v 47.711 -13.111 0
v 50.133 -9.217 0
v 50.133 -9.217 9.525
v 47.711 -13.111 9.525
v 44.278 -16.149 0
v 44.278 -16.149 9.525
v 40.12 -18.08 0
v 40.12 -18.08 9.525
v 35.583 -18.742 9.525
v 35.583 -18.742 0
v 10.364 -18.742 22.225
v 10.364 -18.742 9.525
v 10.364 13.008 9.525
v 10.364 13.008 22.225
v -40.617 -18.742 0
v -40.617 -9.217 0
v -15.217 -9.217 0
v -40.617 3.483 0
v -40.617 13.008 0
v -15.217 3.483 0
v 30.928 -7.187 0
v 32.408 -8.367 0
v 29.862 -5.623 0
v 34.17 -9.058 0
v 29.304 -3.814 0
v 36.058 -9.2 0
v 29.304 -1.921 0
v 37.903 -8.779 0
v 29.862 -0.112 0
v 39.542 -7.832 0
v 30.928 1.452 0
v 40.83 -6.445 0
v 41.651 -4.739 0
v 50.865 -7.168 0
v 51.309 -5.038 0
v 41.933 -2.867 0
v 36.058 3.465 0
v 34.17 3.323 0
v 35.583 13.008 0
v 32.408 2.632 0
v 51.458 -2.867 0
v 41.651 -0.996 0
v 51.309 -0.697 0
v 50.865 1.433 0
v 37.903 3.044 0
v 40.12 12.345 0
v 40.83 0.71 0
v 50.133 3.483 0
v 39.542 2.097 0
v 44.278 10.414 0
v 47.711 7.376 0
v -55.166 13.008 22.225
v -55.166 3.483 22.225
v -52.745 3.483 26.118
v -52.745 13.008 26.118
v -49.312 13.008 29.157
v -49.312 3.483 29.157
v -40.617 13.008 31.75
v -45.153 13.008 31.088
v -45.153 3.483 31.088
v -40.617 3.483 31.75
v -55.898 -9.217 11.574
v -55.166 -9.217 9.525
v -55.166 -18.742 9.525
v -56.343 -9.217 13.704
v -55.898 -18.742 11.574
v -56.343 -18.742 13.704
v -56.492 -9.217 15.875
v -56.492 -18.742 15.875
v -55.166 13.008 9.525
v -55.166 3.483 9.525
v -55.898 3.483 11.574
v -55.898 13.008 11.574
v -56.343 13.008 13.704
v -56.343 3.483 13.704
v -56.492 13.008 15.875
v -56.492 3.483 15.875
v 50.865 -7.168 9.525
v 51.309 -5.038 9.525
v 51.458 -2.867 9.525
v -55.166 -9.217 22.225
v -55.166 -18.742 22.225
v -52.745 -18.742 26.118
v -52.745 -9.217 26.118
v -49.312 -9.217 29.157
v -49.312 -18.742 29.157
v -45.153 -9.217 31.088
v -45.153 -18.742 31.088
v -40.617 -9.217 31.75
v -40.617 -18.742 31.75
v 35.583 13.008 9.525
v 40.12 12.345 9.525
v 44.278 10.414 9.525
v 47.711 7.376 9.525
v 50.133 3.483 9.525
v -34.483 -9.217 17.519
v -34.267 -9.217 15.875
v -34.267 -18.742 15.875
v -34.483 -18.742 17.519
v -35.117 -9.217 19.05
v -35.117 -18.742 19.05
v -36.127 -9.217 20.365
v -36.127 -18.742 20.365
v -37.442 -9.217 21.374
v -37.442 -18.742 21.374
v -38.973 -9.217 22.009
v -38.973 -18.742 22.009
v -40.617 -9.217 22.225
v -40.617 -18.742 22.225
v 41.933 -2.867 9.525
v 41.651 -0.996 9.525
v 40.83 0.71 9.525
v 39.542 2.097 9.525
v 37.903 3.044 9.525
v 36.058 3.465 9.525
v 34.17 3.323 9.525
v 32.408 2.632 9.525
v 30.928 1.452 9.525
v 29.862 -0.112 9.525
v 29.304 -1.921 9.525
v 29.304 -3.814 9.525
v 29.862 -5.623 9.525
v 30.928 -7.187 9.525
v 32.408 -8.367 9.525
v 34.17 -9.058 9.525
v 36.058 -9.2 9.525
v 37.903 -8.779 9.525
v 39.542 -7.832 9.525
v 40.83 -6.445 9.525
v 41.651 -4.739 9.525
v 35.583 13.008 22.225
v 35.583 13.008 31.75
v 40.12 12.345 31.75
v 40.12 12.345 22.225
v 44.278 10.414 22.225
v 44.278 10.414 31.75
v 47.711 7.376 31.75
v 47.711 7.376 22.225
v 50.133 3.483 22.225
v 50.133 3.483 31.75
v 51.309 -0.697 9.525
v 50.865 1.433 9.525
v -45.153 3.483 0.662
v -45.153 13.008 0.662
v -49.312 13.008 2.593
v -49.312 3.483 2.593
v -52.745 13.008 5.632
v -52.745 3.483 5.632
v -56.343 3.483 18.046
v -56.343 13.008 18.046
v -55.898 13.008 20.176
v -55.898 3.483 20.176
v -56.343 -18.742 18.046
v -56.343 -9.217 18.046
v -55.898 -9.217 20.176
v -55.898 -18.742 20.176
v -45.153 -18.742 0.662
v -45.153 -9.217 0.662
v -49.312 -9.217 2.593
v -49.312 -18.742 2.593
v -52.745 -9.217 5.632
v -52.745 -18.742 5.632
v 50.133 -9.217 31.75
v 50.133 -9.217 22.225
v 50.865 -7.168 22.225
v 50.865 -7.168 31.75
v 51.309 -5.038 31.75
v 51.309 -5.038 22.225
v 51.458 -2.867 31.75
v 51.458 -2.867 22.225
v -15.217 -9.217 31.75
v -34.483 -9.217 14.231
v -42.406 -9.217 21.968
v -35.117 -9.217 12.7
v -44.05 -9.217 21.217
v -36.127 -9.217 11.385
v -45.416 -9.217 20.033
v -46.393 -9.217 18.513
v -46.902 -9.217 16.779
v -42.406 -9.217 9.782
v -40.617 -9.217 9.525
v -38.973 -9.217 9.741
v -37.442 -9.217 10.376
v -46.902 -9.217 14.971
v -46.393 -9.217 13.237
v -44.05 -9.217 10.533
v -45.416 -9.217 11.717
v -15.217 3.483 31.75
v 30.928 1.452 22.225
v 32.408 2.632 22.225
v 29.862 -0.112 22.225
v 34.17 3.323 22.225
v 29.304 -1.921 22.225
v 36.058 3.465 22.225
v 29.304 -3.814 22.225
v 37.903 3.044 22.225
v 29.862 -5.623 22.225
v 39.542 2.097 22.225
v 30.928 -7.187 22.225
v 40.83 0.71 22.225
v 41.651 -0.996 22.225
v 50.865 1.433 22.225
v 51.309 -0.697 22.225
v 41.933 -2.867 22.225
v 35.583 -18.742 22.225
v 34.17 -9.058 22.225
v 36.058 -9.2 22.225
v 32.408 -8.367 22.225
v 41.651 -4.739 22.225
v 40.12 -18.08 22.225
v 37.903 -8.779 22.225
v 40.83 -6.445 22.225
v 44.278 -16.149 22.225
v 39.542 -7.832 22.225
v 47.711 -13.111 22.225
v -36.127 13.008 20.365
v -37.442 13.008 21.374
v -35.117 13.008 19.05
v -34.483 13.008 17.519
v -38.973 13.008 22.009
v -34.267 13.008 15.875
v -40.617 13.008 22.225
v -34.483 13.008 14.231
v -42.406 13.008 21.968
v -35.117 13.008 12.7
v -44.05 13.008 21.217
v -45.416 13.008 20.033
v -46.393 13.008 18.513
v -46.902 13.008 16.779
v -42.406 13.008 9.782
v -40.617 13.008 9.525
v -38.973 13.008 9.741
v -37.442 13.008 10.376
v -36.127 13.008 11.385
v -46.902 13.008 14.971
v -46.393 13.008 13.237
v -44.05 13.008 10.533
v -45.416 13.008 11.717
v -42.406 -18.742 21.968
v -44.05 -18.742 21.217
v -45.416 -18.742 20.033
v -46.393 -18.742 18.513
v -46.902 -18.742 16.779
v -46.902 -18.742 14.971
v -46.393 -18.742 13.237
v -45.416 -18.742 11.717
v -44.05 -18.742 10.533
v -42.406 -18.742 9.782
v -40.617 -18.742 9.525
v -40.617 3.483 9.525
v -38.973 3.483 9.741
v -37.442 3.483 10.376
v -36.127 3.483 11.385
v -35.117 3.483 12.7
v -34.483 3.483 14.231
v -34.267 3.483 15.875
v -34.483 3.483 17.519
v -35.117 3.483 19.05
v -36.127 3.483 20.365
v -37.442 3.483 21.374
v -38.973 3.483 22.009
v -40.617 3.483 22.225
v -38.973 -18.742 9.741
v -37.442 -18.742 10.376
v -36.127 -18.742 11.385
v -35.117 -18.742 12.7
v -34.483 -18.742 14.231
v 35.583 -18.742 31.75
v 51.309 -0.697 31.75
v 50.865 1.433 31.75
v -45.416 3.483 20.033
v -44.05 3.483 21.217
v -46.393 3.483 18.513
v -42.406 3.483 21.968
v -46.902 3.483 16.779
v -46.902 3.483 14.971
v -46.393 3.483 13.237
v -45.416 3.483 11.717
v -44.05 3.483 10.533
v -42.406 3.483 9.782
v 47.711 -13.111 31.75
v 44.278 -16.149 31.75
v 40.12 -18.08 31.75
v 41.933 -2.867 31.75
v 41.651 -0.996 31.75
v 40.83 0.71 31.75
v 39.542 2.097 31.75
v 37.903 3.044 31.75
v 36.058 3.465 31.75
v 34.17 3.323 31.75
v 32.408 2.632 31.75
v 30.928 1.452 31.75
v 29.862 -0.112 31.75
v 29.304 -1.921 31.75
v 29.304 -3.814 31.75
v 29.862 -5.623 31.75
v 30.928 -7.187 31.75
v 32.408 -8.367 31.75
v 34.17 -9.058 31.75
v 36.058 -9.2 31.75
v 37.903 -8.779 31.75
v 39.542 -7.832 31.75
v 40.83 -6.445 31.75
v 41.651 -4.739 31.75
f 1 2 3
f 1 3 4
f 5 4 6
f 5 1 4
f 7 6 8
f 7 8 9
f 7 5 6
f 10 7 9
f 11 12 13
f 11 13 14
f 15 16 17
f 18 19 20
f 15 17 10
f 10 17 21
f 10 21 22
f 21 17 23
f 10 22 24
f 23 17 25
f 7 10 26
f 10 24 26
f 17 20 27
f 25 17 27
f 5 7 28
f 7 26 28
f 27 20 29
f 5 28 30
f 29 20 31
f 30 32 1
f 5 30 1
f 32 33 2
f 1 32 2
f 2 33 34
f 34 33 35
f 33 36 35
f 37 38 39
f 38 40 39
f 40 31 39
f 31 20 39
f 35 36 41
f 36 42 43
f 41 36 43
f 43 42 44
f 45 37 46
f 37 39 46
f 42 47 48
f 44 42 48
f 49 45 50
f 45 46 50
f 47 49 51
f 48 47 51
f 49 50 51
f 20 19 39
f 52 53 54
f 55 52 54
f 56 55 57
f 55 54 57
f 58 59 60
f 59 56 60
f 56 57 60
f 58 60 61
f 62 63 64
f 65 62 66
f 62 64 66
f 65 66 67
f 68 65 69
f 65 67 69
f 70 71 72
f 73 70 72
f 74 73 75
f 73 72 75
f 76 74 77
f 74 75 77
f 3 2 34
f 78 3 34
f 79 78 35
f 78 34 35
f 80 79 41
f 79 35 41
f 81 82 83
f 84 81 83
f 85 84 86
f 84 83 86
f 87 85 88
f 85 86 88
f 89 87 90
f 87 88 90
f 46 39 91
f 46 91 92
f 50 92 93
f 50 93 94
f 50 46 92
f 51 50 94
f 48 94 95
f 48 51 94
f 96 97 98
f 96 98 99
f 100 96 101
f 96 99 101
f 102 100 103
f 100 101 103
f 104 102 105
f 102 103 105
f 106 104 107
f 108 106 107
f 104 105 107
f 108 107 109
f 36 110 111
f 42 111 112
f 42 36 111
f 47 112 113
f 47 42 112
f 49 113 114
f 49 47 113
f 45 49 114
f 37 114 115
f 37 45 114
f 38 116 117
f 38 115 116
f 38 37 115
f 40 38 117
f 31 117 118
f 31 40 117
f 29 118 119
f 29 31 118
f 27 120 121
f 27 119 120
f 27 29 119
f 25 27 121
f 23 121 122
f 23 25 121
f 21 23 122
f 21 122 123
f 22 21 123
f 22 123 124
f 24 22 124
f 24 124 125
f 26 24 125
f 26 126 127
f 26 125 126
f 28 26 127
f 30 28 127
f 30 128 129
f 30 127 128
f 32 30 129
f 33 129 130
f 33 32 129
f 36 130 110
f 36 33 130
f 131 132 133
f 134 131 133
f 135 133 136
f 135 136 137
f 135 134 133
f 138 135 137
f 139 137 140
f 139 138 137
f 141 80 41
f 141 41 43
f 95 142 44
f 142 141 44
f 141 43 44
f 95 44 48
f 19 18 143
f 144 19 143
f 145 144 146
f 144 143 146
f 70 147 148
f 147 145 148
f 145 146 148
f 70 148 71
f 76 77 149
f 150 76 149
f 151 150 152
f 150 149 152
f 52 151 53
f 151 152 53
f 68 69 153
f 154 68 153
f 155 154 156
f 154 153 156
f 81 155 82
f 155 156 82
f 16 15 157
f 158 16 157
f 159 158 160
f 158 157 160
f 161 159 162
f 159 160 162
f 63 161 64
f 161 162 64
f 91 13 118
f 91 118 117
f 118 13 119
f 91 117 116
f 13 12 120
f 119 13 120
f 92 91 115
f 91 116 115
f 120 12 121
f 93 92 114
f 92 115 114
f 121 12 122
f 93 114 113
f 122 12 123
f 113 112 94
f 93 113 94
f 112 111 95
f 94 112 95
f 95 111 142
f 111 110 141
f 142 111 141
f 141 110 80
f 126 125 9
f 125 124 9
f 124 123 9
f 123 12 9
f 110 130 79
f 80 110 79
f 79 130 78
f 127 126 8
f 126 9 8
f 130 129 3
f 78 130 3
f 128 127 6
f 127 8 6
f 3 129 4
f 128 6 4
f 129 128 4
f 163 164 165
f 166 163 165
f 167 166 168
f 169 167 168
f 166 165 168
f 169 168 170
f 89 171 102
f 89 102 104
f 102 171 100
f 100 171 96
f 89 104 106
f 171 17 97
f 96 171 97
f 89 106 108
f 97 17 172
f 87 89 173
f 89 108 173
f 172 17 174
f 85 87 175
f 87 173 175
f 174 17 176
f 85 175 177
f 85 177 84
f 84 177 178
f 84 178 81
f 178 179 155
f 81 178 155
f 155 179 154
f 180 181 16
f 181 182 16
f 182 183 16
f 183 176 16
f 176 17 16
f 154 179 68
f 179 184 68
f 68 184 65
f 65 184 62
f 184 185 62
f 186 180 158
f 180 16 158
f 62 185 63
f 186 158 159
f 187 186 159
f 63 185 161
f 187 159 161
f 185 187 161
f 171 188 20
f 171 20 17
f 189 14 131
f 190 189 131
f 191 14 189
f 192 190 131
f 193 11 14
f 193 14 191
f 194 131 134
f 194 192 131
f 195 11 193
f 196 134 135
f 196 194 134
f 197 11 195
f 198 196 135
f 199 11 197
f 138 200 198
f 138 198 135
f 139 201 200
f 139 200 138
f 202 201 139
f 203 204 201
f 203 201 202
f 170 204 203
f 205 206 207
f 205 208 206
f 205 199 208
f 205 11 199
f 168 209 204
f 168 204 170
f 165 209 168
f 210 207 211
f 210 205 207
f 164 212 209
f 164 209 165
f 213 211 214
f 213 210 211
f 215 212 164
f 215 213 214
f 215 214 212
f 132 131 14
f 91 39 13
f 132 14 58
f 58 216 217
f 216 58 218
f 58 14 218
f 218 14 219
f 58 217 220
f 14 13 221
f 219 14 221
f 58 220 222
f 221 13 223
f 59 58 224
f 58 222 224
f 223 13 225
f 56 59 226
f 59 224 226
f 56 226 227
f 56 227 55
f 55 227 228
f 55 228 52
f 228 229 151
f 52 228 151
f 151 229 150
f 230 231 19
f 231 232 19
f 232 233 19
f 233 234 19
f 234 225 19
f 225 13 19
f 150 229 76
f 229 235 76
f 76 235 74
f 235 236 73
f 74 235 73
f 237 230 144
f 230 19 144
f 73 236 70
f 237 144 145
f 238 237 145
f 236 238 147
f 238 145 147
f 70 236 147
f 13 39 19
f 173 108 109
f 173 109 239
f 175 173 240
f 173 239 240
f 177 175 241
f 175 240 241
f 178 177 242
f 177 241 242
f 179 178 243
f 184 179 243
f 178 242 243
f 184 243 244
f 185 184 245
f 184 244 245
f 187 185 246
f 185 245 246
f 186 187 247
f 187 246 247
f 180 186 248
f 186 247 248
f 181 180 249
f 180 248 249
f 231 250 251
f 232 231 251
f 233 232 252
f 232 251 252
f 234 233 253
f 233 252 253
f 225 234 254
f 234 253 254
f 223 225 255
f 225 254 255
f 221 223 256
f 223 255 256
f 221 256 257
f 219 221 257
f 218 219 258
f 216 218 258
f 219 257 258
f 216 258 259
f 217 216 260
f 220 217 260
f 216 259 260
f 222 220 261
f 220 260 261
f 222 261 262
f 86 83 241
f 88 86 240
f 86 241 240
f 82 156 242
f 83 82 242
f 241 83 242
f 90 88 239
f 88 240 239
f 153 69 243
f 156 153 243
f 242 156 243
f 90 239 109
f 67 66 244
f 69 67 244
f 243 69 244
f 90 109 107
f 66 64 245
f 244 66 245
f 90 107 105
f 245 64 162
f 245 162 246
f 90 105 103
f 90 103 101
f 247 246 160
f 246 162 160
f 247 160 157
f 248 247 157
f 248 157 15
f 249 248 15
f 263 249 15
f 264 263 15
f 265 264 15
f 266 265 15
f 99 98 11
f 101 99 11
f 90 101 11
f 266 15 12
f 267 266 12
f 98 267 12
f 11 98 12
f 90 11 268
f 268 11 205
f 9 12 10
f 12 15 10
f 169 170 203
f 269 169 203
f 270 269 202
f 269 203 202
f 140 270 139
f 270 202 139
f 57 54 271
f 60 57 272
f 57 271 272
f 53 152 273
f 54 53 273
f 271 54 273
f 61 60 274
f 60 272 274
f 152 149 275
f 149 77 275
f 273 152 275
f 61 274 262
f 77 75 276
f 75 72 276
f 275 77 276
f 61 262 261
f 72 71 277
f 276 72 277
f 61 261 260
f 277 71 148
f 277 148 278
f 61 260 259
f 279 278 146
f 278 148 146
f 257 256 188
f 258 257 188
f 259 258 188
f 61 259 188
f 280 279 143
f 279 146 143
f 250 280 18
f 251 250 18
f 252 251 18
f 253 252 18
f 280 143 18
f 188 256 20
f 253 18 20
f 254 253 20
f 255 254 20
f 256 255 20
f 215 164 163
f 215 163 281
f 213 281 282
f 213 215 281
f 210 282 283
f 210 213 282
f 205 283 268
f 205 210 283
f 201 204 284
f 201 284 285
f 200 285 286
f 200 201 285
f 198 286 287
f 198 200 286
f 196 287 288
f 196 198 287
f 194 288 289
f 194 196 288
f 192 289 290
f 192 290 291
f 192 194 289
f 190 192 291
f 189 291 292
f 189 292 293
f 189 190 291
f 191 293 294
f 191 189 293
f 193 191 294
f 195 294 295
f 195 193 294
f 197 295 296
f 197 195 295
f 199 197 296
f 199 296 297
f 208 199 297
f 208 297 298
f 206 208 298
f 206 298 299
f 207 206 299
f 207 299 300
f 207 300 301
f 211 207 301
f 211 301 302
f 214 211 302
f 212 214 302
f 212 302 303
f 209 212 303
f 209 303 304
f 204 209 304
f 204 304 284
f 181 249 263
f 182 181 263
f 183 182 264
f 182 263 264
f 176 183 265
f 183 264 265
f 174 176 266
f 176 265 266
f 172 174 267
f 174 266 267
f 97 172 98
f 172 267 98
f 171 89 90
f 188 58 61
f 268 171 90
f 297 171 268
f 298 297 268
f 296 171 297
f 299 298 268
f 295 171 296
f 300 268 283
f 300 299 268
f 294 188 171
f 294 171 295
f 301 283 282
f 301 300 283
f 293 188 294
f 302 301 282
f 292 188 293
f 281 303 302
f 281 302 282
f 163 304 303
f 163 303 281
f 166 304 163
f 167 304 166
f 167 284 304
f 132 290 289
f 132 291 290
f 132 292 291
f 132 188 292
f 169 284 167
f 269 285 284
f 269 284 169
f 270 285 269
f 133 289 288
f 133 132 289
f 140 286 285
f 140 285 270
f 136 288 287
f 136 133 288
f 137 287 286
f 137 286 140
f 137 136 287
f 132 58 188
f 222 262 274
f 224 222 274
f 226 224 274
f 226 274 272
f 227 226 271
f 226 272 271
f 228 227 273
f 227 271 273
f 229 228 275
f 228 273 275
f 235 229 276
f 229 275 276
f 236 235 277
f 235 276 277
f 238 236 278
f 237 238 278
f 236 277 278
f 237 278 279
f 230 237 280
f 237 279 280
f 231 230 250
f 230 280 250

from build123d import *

# Parameters (mm, degrees)
F0_R     = 6.35
F1_DEPTH = 31.75
F0_W     = 41.275
F0_H     = 12.7
F3_DEPTH = 31.75
F2_W     = 41.275
F2_H     = 12.7
F4_DEPTH = 31.751
F5_DEPTH = 31.751


with BuildPart() as f1:
    # F0 (on Top) → F1 (new body)
    with BuildSketch(Plane.XY):
        with BuildLine():
            ThreePointArc((35.5833037704, -18.7424994532), (22.3013258492, -11.5625950536), (21.0336259389, 3.4825005468))
            Line((21.0336259389, 3.4825005468), (-15.2166962296, 3.4825005468))
            Line((-15.2166962296, 3.4825005468), (-15.2166962296, -9.2174994532))
            Line((-15.2166962296, -9.2174994532), (-56.4916962296, -9.2174994532))
            Line((-56.4916962296, -9.2174994532), (-56.4916962296, -18.7424994532))
            Line((-56.4916962296, -18.7424994532), (35.5833037704, -18.7424994532))
        make_face()
        with BuildLine():
            Line((35.5833037704, 13.0075005468), (-56.4916962296, 13.0075005468))
            Line((-56.4916962296, 13.0075005468), (-56.4916962296, 3.4825005468))
            Line((-56.4916962296, 3.4825005468), (-15.2166962296, 3.4825005468))
            Line((-15.2166962296, 3.4825005468), (21.0336259389, 3.4825005468))
            ThreePointArc((21.0336259389, 3.4825005468), (26.88820817, 10.414478468), (35.5833037704, 13.0075005468))
        make_face()
        with BuildLine():
            ThreePointArc((50.1329816019, 3.4825005468), (44.2783993708, 10.414478468), (35.5833037704, 13.0075005468))
            ThreePointArc((35.5833037704, 13.0075005468), (26.88820817, 10.414478468), (21.0336259389, 3.4825005468))
            ThreePointArc((21.0336259389, 3.4825005468), (22.3013258492, -11.5625950536), (35.5833037704, -18.7424994532))
            ThreePointArc((35.5833037704, -18.7424994532), (44.2783993708, -16.1494773745), (50.1329816019, -9.2174994532))
            ThreePointArc((50.1329816019, -9.2174994532), (51.1234414882, -6.1109150468), (51.4583037704, -2.8674994532))
            ThreePointArc((51.4583037704, -2.8674994532), (51.1234414882, 0.3759161403), (50.1329816019, 3.4825005468))
        make_face()
        with Locations((35.5833037704, -2.8674994532)):
            Circle(F0_R, mode=Mode.SUBTRACT)
        with BuildLine():
            ThreePointArc((50.1329816019, -9.2174994532), (44.2783993708, -16.1494773745), (35.5833037704, -18.7424994532))
            Line((35.5833037704, -18.7424994532), (51.6392476857, -18.7424994532))
            Line((51.6392476857, -18.7424994532), (51.4583037704, -9.2174994532))
            Line((51.4583037704, -9.2174994532), (50.1329816019, -9.2174994532))
        make_face()
        with BuildLine():
            Line((51.2197911739, 13.0075005468), (35.5833037704, 13.0075005468))
            ThreePointArc((35.5833037704, 13.0075005468), (44.2783993708, 10.414478468), (50.1329816019, 3.4825005468))
            Line((50.1329816019, 3.4825005468), (51.4583037704, 3.4825005468))
            Line((51.4583037704, 3.4825005468), (51.2197911739, 13.0075005468))
        make_face()
    extrude(amount=F1_DEPTH)

    # F0 (on Top) → F3 (cut)
    with BuildSketch(Plane.XY):
        with BuildLine():
            Line((35.5833037704, 13.0075005468), (-56.4916962296, 13.0075005468))
            Line((-56.4916962296, 13.0075005468), (-56.4916962296, 3.4825005468))
            Line((-56.4916962296, 3.4825005468), (-15.2166962296, 3.4825005468))
            Line((-15.2166962296, 3.4825005468), (21.0336259389, 3.4825005468))
            ThreePointArc((21.0336259389, 3.4825005468), (26.88820817, 10.414478468), (35.5833037704, 13.0075005468))
        make_face()
        with BuildLine():
            Line((51.2197911739, 13.0075005468), (35.5833037704, 13.0075005468))
            ThreePointArc((35.5833037704, 13.0075005468), (44.2783993708, 10.414478468), (50.1329816019, 3.4825005468))
            Line((50.1329816019, 3.4825005468), (51.4583037704, 3.4825005468))
            Line((51.4583037704, 3.4825005468), (51.2197911739, 13.0075005468))
        make_face()
        with BuildLine():
            ThreePointArc((50.1329816019, 3.4825005468), (44.2783993708, 10.414478468), (35.5833037704, 13.0075005468))
            ThreePointArc((35.5833037704, 13.0075005468), (26.88820817, 10.414478468), (21.0336259389, 3.4825005468))
            ThreePointArc((21.0336259389, 3.4825005468), (22.3013258492, -11.5625950536), (35.5833037704, -18.7424994532))
            ThreePointArc((35.5833037704, -18.7424994532), (44.2783993708, -16.1494773745), (50.1329816019, -9.2174994532))
            ThreePointArc((50.1329816019, -9.2174994532), (51.1234414882, -6.1109150468), (51.4583037704, -2.8674994532))
            ThreePointArc((51.4583037704, -2.8674994532), (51.1234414882, 0.3759161403), (50.1329816019, 3.4825005468))
        make_face()
        with Locations((35.5833037704, -2.8674994532)):
            Circle(F0_R, mode=Mode.SUBTRACT)
        with Locations((-35.8541962296, -2.8674994532)):
            Rectangle(F0_W, F0_H)
        with BuildLine():
            ThreePointArc((35.5833037704, -18.7424994532), (22.3013258492, -11.5625950536), (21.0336259389, 3.4825005468))
            Line((21.0336259389, 3.4825005468), (-15.2166962296, 3.4825005468))
            Line((-15.2166962296, 3.4825005468), (-15.2166962296, -9.2174994532))
            Line((-15.2166962296, -9.2174994532), (-56.4916962296, -9.2174994532))
            Line((-56.4916962296, -9.2174994532), (-56.4916962296, -18.7424994532))
            Line((-56.4916962296, -18.7424994532), (35.5833037704, -18.7424994532))
        make_face()
        with BuildLine():
            ThreePointArc((50.1329816019, -9.2174994532), (44.2783993708, -16.1494773745), (35.5833037704, -18.7424994532))
            Line((35.5833037704, -18.7424994532), (51.6392476857, -18.7424994532))
            Line((51.6392476857, -18.7424994532), (51.4583037704, -9.2174994532))
            Line((51.4583037704, -9.2174994532), (50.1329816019, -9.2174994532))
        make_face()
    extrude(amount=-F3_DEPTH, mode=Mode.SUBTRACT)

    # F2 (on face) → F4 (cut, through all)
    with BuildSketch(Plane.XZ.offset(18.7424994532)):
        with BuildLine():
            Line((-56.4916962296, 31.75), (-56.4916962296, 22.225))
            Line((-56.4916962296, 22.225), (-55.1663740611, 22.225))
            ThreePointArc((-55.1663740611, 22.225), (-49.31179183, 29.1569779212), (-40.6166962296, 31.75))
            Line((-40.6166962296, 31.75), (-56.4916962296, 31.75))
        make_face()
        with BuildLine():
            Line((-55.1663740611, 22.225), (-56.4916962296, 22.225))
            Line((-56.4916962296, 22.225), (-56.4916962296, 15.875))
            ThreePointArc((-56.4916962296, 15.875), (-56.1568339474, 19.1184155936), (-55.1663740611, 22.225))
        make_face()
        with BuildLine():
            ThreePointArc((-55.1663740611, 9.525), (-56.1568339474, 12.6315844064), (-56.4916962296, 15.875))
            Line((-56.4916962296, 15.875), (-56.4916962296, 9.525))
            Line((-56.4916962296, 9.525), (-55.1663740611, 9.525))
        make_face()
        with BuildLine():
            ThreePointArc((-40.6166962296, 0), (-49.31179183, 2.5930220788), (-55.1663740611, 9.525))
            Line((-55.1663740611, 9.525), (-56.4916962296, 9.525))
            Line((-56.4916962296, 9.525), (-56.4916962296, 0))
            Line((-56.4916962296, 0), (-40.6166962296, 0))
        make_face()
        with BuildLine():
            Line((-40.6166962296, 9.525), (-40.6166962296, 22.225))
            ThreePointArc((-40.6166962296, 22.225), (-46.9666962296, 15.875), (-40.6166962296, 9.525))
        make_face()
        with BuildLine():
            ThreePointArc((-34.2666962296, 15.875), (-36.126568169, 20.3651280605), (-40.6166962296, 22.225))
            Line((-40.6166962296, 22.225), (-40.6166962296, 9.525))
            ThreePointArc((-40.6166962296, 9.525), (-36.126568169, 11.3848719395), (-34.2666962296, 15.875))
        make_face()
        with Locations((31.0017476857, 15.875)):
            Rectangle(F2_W, F2_H)
    extrude(amount=-F4_DEPTH, mode=Mode.SUBTRACT)

    # F0 (on Top) → F5 (cut, through all)
    with BuildSketch(Plane.XY):
        with BuildLine():
            Line((51.2197911739, 13.0075005468), (35.5833037704, 13.0075005468))
            ThreePointArc((35.5833037704, 13.0075005468), (44.2783993708, 10.414478468), (50.1329816019, 3.4825005468))
            Line((50.1329816019, 3.4825005468), (51.4583037704, 3.4825005468))
            Line((51.4583037704, 3.4825005468), (51.2197911739, 13.0075005468))
        make_face()
        with BuildLine():
            ThreePointArc((50.1329816019, -9.2174994532), (44.2783993708, -16.1494773745), (35.5833037704, -18.7424994532))
            Line((35.5833037704, -18.7424994532), (51.6392476857, -18.7424994532))
            Line((51.6392476857, -18.7424994532), (51.4583037704, -9.2174994532))
            Line((51.4583037704, -9.2174994532), (50.1329816019, -9.2174994532))
        make_face()
    extrude(amount=F5_DEPTH, mode=Mode.SUBTRACT)


solid = f1.part
